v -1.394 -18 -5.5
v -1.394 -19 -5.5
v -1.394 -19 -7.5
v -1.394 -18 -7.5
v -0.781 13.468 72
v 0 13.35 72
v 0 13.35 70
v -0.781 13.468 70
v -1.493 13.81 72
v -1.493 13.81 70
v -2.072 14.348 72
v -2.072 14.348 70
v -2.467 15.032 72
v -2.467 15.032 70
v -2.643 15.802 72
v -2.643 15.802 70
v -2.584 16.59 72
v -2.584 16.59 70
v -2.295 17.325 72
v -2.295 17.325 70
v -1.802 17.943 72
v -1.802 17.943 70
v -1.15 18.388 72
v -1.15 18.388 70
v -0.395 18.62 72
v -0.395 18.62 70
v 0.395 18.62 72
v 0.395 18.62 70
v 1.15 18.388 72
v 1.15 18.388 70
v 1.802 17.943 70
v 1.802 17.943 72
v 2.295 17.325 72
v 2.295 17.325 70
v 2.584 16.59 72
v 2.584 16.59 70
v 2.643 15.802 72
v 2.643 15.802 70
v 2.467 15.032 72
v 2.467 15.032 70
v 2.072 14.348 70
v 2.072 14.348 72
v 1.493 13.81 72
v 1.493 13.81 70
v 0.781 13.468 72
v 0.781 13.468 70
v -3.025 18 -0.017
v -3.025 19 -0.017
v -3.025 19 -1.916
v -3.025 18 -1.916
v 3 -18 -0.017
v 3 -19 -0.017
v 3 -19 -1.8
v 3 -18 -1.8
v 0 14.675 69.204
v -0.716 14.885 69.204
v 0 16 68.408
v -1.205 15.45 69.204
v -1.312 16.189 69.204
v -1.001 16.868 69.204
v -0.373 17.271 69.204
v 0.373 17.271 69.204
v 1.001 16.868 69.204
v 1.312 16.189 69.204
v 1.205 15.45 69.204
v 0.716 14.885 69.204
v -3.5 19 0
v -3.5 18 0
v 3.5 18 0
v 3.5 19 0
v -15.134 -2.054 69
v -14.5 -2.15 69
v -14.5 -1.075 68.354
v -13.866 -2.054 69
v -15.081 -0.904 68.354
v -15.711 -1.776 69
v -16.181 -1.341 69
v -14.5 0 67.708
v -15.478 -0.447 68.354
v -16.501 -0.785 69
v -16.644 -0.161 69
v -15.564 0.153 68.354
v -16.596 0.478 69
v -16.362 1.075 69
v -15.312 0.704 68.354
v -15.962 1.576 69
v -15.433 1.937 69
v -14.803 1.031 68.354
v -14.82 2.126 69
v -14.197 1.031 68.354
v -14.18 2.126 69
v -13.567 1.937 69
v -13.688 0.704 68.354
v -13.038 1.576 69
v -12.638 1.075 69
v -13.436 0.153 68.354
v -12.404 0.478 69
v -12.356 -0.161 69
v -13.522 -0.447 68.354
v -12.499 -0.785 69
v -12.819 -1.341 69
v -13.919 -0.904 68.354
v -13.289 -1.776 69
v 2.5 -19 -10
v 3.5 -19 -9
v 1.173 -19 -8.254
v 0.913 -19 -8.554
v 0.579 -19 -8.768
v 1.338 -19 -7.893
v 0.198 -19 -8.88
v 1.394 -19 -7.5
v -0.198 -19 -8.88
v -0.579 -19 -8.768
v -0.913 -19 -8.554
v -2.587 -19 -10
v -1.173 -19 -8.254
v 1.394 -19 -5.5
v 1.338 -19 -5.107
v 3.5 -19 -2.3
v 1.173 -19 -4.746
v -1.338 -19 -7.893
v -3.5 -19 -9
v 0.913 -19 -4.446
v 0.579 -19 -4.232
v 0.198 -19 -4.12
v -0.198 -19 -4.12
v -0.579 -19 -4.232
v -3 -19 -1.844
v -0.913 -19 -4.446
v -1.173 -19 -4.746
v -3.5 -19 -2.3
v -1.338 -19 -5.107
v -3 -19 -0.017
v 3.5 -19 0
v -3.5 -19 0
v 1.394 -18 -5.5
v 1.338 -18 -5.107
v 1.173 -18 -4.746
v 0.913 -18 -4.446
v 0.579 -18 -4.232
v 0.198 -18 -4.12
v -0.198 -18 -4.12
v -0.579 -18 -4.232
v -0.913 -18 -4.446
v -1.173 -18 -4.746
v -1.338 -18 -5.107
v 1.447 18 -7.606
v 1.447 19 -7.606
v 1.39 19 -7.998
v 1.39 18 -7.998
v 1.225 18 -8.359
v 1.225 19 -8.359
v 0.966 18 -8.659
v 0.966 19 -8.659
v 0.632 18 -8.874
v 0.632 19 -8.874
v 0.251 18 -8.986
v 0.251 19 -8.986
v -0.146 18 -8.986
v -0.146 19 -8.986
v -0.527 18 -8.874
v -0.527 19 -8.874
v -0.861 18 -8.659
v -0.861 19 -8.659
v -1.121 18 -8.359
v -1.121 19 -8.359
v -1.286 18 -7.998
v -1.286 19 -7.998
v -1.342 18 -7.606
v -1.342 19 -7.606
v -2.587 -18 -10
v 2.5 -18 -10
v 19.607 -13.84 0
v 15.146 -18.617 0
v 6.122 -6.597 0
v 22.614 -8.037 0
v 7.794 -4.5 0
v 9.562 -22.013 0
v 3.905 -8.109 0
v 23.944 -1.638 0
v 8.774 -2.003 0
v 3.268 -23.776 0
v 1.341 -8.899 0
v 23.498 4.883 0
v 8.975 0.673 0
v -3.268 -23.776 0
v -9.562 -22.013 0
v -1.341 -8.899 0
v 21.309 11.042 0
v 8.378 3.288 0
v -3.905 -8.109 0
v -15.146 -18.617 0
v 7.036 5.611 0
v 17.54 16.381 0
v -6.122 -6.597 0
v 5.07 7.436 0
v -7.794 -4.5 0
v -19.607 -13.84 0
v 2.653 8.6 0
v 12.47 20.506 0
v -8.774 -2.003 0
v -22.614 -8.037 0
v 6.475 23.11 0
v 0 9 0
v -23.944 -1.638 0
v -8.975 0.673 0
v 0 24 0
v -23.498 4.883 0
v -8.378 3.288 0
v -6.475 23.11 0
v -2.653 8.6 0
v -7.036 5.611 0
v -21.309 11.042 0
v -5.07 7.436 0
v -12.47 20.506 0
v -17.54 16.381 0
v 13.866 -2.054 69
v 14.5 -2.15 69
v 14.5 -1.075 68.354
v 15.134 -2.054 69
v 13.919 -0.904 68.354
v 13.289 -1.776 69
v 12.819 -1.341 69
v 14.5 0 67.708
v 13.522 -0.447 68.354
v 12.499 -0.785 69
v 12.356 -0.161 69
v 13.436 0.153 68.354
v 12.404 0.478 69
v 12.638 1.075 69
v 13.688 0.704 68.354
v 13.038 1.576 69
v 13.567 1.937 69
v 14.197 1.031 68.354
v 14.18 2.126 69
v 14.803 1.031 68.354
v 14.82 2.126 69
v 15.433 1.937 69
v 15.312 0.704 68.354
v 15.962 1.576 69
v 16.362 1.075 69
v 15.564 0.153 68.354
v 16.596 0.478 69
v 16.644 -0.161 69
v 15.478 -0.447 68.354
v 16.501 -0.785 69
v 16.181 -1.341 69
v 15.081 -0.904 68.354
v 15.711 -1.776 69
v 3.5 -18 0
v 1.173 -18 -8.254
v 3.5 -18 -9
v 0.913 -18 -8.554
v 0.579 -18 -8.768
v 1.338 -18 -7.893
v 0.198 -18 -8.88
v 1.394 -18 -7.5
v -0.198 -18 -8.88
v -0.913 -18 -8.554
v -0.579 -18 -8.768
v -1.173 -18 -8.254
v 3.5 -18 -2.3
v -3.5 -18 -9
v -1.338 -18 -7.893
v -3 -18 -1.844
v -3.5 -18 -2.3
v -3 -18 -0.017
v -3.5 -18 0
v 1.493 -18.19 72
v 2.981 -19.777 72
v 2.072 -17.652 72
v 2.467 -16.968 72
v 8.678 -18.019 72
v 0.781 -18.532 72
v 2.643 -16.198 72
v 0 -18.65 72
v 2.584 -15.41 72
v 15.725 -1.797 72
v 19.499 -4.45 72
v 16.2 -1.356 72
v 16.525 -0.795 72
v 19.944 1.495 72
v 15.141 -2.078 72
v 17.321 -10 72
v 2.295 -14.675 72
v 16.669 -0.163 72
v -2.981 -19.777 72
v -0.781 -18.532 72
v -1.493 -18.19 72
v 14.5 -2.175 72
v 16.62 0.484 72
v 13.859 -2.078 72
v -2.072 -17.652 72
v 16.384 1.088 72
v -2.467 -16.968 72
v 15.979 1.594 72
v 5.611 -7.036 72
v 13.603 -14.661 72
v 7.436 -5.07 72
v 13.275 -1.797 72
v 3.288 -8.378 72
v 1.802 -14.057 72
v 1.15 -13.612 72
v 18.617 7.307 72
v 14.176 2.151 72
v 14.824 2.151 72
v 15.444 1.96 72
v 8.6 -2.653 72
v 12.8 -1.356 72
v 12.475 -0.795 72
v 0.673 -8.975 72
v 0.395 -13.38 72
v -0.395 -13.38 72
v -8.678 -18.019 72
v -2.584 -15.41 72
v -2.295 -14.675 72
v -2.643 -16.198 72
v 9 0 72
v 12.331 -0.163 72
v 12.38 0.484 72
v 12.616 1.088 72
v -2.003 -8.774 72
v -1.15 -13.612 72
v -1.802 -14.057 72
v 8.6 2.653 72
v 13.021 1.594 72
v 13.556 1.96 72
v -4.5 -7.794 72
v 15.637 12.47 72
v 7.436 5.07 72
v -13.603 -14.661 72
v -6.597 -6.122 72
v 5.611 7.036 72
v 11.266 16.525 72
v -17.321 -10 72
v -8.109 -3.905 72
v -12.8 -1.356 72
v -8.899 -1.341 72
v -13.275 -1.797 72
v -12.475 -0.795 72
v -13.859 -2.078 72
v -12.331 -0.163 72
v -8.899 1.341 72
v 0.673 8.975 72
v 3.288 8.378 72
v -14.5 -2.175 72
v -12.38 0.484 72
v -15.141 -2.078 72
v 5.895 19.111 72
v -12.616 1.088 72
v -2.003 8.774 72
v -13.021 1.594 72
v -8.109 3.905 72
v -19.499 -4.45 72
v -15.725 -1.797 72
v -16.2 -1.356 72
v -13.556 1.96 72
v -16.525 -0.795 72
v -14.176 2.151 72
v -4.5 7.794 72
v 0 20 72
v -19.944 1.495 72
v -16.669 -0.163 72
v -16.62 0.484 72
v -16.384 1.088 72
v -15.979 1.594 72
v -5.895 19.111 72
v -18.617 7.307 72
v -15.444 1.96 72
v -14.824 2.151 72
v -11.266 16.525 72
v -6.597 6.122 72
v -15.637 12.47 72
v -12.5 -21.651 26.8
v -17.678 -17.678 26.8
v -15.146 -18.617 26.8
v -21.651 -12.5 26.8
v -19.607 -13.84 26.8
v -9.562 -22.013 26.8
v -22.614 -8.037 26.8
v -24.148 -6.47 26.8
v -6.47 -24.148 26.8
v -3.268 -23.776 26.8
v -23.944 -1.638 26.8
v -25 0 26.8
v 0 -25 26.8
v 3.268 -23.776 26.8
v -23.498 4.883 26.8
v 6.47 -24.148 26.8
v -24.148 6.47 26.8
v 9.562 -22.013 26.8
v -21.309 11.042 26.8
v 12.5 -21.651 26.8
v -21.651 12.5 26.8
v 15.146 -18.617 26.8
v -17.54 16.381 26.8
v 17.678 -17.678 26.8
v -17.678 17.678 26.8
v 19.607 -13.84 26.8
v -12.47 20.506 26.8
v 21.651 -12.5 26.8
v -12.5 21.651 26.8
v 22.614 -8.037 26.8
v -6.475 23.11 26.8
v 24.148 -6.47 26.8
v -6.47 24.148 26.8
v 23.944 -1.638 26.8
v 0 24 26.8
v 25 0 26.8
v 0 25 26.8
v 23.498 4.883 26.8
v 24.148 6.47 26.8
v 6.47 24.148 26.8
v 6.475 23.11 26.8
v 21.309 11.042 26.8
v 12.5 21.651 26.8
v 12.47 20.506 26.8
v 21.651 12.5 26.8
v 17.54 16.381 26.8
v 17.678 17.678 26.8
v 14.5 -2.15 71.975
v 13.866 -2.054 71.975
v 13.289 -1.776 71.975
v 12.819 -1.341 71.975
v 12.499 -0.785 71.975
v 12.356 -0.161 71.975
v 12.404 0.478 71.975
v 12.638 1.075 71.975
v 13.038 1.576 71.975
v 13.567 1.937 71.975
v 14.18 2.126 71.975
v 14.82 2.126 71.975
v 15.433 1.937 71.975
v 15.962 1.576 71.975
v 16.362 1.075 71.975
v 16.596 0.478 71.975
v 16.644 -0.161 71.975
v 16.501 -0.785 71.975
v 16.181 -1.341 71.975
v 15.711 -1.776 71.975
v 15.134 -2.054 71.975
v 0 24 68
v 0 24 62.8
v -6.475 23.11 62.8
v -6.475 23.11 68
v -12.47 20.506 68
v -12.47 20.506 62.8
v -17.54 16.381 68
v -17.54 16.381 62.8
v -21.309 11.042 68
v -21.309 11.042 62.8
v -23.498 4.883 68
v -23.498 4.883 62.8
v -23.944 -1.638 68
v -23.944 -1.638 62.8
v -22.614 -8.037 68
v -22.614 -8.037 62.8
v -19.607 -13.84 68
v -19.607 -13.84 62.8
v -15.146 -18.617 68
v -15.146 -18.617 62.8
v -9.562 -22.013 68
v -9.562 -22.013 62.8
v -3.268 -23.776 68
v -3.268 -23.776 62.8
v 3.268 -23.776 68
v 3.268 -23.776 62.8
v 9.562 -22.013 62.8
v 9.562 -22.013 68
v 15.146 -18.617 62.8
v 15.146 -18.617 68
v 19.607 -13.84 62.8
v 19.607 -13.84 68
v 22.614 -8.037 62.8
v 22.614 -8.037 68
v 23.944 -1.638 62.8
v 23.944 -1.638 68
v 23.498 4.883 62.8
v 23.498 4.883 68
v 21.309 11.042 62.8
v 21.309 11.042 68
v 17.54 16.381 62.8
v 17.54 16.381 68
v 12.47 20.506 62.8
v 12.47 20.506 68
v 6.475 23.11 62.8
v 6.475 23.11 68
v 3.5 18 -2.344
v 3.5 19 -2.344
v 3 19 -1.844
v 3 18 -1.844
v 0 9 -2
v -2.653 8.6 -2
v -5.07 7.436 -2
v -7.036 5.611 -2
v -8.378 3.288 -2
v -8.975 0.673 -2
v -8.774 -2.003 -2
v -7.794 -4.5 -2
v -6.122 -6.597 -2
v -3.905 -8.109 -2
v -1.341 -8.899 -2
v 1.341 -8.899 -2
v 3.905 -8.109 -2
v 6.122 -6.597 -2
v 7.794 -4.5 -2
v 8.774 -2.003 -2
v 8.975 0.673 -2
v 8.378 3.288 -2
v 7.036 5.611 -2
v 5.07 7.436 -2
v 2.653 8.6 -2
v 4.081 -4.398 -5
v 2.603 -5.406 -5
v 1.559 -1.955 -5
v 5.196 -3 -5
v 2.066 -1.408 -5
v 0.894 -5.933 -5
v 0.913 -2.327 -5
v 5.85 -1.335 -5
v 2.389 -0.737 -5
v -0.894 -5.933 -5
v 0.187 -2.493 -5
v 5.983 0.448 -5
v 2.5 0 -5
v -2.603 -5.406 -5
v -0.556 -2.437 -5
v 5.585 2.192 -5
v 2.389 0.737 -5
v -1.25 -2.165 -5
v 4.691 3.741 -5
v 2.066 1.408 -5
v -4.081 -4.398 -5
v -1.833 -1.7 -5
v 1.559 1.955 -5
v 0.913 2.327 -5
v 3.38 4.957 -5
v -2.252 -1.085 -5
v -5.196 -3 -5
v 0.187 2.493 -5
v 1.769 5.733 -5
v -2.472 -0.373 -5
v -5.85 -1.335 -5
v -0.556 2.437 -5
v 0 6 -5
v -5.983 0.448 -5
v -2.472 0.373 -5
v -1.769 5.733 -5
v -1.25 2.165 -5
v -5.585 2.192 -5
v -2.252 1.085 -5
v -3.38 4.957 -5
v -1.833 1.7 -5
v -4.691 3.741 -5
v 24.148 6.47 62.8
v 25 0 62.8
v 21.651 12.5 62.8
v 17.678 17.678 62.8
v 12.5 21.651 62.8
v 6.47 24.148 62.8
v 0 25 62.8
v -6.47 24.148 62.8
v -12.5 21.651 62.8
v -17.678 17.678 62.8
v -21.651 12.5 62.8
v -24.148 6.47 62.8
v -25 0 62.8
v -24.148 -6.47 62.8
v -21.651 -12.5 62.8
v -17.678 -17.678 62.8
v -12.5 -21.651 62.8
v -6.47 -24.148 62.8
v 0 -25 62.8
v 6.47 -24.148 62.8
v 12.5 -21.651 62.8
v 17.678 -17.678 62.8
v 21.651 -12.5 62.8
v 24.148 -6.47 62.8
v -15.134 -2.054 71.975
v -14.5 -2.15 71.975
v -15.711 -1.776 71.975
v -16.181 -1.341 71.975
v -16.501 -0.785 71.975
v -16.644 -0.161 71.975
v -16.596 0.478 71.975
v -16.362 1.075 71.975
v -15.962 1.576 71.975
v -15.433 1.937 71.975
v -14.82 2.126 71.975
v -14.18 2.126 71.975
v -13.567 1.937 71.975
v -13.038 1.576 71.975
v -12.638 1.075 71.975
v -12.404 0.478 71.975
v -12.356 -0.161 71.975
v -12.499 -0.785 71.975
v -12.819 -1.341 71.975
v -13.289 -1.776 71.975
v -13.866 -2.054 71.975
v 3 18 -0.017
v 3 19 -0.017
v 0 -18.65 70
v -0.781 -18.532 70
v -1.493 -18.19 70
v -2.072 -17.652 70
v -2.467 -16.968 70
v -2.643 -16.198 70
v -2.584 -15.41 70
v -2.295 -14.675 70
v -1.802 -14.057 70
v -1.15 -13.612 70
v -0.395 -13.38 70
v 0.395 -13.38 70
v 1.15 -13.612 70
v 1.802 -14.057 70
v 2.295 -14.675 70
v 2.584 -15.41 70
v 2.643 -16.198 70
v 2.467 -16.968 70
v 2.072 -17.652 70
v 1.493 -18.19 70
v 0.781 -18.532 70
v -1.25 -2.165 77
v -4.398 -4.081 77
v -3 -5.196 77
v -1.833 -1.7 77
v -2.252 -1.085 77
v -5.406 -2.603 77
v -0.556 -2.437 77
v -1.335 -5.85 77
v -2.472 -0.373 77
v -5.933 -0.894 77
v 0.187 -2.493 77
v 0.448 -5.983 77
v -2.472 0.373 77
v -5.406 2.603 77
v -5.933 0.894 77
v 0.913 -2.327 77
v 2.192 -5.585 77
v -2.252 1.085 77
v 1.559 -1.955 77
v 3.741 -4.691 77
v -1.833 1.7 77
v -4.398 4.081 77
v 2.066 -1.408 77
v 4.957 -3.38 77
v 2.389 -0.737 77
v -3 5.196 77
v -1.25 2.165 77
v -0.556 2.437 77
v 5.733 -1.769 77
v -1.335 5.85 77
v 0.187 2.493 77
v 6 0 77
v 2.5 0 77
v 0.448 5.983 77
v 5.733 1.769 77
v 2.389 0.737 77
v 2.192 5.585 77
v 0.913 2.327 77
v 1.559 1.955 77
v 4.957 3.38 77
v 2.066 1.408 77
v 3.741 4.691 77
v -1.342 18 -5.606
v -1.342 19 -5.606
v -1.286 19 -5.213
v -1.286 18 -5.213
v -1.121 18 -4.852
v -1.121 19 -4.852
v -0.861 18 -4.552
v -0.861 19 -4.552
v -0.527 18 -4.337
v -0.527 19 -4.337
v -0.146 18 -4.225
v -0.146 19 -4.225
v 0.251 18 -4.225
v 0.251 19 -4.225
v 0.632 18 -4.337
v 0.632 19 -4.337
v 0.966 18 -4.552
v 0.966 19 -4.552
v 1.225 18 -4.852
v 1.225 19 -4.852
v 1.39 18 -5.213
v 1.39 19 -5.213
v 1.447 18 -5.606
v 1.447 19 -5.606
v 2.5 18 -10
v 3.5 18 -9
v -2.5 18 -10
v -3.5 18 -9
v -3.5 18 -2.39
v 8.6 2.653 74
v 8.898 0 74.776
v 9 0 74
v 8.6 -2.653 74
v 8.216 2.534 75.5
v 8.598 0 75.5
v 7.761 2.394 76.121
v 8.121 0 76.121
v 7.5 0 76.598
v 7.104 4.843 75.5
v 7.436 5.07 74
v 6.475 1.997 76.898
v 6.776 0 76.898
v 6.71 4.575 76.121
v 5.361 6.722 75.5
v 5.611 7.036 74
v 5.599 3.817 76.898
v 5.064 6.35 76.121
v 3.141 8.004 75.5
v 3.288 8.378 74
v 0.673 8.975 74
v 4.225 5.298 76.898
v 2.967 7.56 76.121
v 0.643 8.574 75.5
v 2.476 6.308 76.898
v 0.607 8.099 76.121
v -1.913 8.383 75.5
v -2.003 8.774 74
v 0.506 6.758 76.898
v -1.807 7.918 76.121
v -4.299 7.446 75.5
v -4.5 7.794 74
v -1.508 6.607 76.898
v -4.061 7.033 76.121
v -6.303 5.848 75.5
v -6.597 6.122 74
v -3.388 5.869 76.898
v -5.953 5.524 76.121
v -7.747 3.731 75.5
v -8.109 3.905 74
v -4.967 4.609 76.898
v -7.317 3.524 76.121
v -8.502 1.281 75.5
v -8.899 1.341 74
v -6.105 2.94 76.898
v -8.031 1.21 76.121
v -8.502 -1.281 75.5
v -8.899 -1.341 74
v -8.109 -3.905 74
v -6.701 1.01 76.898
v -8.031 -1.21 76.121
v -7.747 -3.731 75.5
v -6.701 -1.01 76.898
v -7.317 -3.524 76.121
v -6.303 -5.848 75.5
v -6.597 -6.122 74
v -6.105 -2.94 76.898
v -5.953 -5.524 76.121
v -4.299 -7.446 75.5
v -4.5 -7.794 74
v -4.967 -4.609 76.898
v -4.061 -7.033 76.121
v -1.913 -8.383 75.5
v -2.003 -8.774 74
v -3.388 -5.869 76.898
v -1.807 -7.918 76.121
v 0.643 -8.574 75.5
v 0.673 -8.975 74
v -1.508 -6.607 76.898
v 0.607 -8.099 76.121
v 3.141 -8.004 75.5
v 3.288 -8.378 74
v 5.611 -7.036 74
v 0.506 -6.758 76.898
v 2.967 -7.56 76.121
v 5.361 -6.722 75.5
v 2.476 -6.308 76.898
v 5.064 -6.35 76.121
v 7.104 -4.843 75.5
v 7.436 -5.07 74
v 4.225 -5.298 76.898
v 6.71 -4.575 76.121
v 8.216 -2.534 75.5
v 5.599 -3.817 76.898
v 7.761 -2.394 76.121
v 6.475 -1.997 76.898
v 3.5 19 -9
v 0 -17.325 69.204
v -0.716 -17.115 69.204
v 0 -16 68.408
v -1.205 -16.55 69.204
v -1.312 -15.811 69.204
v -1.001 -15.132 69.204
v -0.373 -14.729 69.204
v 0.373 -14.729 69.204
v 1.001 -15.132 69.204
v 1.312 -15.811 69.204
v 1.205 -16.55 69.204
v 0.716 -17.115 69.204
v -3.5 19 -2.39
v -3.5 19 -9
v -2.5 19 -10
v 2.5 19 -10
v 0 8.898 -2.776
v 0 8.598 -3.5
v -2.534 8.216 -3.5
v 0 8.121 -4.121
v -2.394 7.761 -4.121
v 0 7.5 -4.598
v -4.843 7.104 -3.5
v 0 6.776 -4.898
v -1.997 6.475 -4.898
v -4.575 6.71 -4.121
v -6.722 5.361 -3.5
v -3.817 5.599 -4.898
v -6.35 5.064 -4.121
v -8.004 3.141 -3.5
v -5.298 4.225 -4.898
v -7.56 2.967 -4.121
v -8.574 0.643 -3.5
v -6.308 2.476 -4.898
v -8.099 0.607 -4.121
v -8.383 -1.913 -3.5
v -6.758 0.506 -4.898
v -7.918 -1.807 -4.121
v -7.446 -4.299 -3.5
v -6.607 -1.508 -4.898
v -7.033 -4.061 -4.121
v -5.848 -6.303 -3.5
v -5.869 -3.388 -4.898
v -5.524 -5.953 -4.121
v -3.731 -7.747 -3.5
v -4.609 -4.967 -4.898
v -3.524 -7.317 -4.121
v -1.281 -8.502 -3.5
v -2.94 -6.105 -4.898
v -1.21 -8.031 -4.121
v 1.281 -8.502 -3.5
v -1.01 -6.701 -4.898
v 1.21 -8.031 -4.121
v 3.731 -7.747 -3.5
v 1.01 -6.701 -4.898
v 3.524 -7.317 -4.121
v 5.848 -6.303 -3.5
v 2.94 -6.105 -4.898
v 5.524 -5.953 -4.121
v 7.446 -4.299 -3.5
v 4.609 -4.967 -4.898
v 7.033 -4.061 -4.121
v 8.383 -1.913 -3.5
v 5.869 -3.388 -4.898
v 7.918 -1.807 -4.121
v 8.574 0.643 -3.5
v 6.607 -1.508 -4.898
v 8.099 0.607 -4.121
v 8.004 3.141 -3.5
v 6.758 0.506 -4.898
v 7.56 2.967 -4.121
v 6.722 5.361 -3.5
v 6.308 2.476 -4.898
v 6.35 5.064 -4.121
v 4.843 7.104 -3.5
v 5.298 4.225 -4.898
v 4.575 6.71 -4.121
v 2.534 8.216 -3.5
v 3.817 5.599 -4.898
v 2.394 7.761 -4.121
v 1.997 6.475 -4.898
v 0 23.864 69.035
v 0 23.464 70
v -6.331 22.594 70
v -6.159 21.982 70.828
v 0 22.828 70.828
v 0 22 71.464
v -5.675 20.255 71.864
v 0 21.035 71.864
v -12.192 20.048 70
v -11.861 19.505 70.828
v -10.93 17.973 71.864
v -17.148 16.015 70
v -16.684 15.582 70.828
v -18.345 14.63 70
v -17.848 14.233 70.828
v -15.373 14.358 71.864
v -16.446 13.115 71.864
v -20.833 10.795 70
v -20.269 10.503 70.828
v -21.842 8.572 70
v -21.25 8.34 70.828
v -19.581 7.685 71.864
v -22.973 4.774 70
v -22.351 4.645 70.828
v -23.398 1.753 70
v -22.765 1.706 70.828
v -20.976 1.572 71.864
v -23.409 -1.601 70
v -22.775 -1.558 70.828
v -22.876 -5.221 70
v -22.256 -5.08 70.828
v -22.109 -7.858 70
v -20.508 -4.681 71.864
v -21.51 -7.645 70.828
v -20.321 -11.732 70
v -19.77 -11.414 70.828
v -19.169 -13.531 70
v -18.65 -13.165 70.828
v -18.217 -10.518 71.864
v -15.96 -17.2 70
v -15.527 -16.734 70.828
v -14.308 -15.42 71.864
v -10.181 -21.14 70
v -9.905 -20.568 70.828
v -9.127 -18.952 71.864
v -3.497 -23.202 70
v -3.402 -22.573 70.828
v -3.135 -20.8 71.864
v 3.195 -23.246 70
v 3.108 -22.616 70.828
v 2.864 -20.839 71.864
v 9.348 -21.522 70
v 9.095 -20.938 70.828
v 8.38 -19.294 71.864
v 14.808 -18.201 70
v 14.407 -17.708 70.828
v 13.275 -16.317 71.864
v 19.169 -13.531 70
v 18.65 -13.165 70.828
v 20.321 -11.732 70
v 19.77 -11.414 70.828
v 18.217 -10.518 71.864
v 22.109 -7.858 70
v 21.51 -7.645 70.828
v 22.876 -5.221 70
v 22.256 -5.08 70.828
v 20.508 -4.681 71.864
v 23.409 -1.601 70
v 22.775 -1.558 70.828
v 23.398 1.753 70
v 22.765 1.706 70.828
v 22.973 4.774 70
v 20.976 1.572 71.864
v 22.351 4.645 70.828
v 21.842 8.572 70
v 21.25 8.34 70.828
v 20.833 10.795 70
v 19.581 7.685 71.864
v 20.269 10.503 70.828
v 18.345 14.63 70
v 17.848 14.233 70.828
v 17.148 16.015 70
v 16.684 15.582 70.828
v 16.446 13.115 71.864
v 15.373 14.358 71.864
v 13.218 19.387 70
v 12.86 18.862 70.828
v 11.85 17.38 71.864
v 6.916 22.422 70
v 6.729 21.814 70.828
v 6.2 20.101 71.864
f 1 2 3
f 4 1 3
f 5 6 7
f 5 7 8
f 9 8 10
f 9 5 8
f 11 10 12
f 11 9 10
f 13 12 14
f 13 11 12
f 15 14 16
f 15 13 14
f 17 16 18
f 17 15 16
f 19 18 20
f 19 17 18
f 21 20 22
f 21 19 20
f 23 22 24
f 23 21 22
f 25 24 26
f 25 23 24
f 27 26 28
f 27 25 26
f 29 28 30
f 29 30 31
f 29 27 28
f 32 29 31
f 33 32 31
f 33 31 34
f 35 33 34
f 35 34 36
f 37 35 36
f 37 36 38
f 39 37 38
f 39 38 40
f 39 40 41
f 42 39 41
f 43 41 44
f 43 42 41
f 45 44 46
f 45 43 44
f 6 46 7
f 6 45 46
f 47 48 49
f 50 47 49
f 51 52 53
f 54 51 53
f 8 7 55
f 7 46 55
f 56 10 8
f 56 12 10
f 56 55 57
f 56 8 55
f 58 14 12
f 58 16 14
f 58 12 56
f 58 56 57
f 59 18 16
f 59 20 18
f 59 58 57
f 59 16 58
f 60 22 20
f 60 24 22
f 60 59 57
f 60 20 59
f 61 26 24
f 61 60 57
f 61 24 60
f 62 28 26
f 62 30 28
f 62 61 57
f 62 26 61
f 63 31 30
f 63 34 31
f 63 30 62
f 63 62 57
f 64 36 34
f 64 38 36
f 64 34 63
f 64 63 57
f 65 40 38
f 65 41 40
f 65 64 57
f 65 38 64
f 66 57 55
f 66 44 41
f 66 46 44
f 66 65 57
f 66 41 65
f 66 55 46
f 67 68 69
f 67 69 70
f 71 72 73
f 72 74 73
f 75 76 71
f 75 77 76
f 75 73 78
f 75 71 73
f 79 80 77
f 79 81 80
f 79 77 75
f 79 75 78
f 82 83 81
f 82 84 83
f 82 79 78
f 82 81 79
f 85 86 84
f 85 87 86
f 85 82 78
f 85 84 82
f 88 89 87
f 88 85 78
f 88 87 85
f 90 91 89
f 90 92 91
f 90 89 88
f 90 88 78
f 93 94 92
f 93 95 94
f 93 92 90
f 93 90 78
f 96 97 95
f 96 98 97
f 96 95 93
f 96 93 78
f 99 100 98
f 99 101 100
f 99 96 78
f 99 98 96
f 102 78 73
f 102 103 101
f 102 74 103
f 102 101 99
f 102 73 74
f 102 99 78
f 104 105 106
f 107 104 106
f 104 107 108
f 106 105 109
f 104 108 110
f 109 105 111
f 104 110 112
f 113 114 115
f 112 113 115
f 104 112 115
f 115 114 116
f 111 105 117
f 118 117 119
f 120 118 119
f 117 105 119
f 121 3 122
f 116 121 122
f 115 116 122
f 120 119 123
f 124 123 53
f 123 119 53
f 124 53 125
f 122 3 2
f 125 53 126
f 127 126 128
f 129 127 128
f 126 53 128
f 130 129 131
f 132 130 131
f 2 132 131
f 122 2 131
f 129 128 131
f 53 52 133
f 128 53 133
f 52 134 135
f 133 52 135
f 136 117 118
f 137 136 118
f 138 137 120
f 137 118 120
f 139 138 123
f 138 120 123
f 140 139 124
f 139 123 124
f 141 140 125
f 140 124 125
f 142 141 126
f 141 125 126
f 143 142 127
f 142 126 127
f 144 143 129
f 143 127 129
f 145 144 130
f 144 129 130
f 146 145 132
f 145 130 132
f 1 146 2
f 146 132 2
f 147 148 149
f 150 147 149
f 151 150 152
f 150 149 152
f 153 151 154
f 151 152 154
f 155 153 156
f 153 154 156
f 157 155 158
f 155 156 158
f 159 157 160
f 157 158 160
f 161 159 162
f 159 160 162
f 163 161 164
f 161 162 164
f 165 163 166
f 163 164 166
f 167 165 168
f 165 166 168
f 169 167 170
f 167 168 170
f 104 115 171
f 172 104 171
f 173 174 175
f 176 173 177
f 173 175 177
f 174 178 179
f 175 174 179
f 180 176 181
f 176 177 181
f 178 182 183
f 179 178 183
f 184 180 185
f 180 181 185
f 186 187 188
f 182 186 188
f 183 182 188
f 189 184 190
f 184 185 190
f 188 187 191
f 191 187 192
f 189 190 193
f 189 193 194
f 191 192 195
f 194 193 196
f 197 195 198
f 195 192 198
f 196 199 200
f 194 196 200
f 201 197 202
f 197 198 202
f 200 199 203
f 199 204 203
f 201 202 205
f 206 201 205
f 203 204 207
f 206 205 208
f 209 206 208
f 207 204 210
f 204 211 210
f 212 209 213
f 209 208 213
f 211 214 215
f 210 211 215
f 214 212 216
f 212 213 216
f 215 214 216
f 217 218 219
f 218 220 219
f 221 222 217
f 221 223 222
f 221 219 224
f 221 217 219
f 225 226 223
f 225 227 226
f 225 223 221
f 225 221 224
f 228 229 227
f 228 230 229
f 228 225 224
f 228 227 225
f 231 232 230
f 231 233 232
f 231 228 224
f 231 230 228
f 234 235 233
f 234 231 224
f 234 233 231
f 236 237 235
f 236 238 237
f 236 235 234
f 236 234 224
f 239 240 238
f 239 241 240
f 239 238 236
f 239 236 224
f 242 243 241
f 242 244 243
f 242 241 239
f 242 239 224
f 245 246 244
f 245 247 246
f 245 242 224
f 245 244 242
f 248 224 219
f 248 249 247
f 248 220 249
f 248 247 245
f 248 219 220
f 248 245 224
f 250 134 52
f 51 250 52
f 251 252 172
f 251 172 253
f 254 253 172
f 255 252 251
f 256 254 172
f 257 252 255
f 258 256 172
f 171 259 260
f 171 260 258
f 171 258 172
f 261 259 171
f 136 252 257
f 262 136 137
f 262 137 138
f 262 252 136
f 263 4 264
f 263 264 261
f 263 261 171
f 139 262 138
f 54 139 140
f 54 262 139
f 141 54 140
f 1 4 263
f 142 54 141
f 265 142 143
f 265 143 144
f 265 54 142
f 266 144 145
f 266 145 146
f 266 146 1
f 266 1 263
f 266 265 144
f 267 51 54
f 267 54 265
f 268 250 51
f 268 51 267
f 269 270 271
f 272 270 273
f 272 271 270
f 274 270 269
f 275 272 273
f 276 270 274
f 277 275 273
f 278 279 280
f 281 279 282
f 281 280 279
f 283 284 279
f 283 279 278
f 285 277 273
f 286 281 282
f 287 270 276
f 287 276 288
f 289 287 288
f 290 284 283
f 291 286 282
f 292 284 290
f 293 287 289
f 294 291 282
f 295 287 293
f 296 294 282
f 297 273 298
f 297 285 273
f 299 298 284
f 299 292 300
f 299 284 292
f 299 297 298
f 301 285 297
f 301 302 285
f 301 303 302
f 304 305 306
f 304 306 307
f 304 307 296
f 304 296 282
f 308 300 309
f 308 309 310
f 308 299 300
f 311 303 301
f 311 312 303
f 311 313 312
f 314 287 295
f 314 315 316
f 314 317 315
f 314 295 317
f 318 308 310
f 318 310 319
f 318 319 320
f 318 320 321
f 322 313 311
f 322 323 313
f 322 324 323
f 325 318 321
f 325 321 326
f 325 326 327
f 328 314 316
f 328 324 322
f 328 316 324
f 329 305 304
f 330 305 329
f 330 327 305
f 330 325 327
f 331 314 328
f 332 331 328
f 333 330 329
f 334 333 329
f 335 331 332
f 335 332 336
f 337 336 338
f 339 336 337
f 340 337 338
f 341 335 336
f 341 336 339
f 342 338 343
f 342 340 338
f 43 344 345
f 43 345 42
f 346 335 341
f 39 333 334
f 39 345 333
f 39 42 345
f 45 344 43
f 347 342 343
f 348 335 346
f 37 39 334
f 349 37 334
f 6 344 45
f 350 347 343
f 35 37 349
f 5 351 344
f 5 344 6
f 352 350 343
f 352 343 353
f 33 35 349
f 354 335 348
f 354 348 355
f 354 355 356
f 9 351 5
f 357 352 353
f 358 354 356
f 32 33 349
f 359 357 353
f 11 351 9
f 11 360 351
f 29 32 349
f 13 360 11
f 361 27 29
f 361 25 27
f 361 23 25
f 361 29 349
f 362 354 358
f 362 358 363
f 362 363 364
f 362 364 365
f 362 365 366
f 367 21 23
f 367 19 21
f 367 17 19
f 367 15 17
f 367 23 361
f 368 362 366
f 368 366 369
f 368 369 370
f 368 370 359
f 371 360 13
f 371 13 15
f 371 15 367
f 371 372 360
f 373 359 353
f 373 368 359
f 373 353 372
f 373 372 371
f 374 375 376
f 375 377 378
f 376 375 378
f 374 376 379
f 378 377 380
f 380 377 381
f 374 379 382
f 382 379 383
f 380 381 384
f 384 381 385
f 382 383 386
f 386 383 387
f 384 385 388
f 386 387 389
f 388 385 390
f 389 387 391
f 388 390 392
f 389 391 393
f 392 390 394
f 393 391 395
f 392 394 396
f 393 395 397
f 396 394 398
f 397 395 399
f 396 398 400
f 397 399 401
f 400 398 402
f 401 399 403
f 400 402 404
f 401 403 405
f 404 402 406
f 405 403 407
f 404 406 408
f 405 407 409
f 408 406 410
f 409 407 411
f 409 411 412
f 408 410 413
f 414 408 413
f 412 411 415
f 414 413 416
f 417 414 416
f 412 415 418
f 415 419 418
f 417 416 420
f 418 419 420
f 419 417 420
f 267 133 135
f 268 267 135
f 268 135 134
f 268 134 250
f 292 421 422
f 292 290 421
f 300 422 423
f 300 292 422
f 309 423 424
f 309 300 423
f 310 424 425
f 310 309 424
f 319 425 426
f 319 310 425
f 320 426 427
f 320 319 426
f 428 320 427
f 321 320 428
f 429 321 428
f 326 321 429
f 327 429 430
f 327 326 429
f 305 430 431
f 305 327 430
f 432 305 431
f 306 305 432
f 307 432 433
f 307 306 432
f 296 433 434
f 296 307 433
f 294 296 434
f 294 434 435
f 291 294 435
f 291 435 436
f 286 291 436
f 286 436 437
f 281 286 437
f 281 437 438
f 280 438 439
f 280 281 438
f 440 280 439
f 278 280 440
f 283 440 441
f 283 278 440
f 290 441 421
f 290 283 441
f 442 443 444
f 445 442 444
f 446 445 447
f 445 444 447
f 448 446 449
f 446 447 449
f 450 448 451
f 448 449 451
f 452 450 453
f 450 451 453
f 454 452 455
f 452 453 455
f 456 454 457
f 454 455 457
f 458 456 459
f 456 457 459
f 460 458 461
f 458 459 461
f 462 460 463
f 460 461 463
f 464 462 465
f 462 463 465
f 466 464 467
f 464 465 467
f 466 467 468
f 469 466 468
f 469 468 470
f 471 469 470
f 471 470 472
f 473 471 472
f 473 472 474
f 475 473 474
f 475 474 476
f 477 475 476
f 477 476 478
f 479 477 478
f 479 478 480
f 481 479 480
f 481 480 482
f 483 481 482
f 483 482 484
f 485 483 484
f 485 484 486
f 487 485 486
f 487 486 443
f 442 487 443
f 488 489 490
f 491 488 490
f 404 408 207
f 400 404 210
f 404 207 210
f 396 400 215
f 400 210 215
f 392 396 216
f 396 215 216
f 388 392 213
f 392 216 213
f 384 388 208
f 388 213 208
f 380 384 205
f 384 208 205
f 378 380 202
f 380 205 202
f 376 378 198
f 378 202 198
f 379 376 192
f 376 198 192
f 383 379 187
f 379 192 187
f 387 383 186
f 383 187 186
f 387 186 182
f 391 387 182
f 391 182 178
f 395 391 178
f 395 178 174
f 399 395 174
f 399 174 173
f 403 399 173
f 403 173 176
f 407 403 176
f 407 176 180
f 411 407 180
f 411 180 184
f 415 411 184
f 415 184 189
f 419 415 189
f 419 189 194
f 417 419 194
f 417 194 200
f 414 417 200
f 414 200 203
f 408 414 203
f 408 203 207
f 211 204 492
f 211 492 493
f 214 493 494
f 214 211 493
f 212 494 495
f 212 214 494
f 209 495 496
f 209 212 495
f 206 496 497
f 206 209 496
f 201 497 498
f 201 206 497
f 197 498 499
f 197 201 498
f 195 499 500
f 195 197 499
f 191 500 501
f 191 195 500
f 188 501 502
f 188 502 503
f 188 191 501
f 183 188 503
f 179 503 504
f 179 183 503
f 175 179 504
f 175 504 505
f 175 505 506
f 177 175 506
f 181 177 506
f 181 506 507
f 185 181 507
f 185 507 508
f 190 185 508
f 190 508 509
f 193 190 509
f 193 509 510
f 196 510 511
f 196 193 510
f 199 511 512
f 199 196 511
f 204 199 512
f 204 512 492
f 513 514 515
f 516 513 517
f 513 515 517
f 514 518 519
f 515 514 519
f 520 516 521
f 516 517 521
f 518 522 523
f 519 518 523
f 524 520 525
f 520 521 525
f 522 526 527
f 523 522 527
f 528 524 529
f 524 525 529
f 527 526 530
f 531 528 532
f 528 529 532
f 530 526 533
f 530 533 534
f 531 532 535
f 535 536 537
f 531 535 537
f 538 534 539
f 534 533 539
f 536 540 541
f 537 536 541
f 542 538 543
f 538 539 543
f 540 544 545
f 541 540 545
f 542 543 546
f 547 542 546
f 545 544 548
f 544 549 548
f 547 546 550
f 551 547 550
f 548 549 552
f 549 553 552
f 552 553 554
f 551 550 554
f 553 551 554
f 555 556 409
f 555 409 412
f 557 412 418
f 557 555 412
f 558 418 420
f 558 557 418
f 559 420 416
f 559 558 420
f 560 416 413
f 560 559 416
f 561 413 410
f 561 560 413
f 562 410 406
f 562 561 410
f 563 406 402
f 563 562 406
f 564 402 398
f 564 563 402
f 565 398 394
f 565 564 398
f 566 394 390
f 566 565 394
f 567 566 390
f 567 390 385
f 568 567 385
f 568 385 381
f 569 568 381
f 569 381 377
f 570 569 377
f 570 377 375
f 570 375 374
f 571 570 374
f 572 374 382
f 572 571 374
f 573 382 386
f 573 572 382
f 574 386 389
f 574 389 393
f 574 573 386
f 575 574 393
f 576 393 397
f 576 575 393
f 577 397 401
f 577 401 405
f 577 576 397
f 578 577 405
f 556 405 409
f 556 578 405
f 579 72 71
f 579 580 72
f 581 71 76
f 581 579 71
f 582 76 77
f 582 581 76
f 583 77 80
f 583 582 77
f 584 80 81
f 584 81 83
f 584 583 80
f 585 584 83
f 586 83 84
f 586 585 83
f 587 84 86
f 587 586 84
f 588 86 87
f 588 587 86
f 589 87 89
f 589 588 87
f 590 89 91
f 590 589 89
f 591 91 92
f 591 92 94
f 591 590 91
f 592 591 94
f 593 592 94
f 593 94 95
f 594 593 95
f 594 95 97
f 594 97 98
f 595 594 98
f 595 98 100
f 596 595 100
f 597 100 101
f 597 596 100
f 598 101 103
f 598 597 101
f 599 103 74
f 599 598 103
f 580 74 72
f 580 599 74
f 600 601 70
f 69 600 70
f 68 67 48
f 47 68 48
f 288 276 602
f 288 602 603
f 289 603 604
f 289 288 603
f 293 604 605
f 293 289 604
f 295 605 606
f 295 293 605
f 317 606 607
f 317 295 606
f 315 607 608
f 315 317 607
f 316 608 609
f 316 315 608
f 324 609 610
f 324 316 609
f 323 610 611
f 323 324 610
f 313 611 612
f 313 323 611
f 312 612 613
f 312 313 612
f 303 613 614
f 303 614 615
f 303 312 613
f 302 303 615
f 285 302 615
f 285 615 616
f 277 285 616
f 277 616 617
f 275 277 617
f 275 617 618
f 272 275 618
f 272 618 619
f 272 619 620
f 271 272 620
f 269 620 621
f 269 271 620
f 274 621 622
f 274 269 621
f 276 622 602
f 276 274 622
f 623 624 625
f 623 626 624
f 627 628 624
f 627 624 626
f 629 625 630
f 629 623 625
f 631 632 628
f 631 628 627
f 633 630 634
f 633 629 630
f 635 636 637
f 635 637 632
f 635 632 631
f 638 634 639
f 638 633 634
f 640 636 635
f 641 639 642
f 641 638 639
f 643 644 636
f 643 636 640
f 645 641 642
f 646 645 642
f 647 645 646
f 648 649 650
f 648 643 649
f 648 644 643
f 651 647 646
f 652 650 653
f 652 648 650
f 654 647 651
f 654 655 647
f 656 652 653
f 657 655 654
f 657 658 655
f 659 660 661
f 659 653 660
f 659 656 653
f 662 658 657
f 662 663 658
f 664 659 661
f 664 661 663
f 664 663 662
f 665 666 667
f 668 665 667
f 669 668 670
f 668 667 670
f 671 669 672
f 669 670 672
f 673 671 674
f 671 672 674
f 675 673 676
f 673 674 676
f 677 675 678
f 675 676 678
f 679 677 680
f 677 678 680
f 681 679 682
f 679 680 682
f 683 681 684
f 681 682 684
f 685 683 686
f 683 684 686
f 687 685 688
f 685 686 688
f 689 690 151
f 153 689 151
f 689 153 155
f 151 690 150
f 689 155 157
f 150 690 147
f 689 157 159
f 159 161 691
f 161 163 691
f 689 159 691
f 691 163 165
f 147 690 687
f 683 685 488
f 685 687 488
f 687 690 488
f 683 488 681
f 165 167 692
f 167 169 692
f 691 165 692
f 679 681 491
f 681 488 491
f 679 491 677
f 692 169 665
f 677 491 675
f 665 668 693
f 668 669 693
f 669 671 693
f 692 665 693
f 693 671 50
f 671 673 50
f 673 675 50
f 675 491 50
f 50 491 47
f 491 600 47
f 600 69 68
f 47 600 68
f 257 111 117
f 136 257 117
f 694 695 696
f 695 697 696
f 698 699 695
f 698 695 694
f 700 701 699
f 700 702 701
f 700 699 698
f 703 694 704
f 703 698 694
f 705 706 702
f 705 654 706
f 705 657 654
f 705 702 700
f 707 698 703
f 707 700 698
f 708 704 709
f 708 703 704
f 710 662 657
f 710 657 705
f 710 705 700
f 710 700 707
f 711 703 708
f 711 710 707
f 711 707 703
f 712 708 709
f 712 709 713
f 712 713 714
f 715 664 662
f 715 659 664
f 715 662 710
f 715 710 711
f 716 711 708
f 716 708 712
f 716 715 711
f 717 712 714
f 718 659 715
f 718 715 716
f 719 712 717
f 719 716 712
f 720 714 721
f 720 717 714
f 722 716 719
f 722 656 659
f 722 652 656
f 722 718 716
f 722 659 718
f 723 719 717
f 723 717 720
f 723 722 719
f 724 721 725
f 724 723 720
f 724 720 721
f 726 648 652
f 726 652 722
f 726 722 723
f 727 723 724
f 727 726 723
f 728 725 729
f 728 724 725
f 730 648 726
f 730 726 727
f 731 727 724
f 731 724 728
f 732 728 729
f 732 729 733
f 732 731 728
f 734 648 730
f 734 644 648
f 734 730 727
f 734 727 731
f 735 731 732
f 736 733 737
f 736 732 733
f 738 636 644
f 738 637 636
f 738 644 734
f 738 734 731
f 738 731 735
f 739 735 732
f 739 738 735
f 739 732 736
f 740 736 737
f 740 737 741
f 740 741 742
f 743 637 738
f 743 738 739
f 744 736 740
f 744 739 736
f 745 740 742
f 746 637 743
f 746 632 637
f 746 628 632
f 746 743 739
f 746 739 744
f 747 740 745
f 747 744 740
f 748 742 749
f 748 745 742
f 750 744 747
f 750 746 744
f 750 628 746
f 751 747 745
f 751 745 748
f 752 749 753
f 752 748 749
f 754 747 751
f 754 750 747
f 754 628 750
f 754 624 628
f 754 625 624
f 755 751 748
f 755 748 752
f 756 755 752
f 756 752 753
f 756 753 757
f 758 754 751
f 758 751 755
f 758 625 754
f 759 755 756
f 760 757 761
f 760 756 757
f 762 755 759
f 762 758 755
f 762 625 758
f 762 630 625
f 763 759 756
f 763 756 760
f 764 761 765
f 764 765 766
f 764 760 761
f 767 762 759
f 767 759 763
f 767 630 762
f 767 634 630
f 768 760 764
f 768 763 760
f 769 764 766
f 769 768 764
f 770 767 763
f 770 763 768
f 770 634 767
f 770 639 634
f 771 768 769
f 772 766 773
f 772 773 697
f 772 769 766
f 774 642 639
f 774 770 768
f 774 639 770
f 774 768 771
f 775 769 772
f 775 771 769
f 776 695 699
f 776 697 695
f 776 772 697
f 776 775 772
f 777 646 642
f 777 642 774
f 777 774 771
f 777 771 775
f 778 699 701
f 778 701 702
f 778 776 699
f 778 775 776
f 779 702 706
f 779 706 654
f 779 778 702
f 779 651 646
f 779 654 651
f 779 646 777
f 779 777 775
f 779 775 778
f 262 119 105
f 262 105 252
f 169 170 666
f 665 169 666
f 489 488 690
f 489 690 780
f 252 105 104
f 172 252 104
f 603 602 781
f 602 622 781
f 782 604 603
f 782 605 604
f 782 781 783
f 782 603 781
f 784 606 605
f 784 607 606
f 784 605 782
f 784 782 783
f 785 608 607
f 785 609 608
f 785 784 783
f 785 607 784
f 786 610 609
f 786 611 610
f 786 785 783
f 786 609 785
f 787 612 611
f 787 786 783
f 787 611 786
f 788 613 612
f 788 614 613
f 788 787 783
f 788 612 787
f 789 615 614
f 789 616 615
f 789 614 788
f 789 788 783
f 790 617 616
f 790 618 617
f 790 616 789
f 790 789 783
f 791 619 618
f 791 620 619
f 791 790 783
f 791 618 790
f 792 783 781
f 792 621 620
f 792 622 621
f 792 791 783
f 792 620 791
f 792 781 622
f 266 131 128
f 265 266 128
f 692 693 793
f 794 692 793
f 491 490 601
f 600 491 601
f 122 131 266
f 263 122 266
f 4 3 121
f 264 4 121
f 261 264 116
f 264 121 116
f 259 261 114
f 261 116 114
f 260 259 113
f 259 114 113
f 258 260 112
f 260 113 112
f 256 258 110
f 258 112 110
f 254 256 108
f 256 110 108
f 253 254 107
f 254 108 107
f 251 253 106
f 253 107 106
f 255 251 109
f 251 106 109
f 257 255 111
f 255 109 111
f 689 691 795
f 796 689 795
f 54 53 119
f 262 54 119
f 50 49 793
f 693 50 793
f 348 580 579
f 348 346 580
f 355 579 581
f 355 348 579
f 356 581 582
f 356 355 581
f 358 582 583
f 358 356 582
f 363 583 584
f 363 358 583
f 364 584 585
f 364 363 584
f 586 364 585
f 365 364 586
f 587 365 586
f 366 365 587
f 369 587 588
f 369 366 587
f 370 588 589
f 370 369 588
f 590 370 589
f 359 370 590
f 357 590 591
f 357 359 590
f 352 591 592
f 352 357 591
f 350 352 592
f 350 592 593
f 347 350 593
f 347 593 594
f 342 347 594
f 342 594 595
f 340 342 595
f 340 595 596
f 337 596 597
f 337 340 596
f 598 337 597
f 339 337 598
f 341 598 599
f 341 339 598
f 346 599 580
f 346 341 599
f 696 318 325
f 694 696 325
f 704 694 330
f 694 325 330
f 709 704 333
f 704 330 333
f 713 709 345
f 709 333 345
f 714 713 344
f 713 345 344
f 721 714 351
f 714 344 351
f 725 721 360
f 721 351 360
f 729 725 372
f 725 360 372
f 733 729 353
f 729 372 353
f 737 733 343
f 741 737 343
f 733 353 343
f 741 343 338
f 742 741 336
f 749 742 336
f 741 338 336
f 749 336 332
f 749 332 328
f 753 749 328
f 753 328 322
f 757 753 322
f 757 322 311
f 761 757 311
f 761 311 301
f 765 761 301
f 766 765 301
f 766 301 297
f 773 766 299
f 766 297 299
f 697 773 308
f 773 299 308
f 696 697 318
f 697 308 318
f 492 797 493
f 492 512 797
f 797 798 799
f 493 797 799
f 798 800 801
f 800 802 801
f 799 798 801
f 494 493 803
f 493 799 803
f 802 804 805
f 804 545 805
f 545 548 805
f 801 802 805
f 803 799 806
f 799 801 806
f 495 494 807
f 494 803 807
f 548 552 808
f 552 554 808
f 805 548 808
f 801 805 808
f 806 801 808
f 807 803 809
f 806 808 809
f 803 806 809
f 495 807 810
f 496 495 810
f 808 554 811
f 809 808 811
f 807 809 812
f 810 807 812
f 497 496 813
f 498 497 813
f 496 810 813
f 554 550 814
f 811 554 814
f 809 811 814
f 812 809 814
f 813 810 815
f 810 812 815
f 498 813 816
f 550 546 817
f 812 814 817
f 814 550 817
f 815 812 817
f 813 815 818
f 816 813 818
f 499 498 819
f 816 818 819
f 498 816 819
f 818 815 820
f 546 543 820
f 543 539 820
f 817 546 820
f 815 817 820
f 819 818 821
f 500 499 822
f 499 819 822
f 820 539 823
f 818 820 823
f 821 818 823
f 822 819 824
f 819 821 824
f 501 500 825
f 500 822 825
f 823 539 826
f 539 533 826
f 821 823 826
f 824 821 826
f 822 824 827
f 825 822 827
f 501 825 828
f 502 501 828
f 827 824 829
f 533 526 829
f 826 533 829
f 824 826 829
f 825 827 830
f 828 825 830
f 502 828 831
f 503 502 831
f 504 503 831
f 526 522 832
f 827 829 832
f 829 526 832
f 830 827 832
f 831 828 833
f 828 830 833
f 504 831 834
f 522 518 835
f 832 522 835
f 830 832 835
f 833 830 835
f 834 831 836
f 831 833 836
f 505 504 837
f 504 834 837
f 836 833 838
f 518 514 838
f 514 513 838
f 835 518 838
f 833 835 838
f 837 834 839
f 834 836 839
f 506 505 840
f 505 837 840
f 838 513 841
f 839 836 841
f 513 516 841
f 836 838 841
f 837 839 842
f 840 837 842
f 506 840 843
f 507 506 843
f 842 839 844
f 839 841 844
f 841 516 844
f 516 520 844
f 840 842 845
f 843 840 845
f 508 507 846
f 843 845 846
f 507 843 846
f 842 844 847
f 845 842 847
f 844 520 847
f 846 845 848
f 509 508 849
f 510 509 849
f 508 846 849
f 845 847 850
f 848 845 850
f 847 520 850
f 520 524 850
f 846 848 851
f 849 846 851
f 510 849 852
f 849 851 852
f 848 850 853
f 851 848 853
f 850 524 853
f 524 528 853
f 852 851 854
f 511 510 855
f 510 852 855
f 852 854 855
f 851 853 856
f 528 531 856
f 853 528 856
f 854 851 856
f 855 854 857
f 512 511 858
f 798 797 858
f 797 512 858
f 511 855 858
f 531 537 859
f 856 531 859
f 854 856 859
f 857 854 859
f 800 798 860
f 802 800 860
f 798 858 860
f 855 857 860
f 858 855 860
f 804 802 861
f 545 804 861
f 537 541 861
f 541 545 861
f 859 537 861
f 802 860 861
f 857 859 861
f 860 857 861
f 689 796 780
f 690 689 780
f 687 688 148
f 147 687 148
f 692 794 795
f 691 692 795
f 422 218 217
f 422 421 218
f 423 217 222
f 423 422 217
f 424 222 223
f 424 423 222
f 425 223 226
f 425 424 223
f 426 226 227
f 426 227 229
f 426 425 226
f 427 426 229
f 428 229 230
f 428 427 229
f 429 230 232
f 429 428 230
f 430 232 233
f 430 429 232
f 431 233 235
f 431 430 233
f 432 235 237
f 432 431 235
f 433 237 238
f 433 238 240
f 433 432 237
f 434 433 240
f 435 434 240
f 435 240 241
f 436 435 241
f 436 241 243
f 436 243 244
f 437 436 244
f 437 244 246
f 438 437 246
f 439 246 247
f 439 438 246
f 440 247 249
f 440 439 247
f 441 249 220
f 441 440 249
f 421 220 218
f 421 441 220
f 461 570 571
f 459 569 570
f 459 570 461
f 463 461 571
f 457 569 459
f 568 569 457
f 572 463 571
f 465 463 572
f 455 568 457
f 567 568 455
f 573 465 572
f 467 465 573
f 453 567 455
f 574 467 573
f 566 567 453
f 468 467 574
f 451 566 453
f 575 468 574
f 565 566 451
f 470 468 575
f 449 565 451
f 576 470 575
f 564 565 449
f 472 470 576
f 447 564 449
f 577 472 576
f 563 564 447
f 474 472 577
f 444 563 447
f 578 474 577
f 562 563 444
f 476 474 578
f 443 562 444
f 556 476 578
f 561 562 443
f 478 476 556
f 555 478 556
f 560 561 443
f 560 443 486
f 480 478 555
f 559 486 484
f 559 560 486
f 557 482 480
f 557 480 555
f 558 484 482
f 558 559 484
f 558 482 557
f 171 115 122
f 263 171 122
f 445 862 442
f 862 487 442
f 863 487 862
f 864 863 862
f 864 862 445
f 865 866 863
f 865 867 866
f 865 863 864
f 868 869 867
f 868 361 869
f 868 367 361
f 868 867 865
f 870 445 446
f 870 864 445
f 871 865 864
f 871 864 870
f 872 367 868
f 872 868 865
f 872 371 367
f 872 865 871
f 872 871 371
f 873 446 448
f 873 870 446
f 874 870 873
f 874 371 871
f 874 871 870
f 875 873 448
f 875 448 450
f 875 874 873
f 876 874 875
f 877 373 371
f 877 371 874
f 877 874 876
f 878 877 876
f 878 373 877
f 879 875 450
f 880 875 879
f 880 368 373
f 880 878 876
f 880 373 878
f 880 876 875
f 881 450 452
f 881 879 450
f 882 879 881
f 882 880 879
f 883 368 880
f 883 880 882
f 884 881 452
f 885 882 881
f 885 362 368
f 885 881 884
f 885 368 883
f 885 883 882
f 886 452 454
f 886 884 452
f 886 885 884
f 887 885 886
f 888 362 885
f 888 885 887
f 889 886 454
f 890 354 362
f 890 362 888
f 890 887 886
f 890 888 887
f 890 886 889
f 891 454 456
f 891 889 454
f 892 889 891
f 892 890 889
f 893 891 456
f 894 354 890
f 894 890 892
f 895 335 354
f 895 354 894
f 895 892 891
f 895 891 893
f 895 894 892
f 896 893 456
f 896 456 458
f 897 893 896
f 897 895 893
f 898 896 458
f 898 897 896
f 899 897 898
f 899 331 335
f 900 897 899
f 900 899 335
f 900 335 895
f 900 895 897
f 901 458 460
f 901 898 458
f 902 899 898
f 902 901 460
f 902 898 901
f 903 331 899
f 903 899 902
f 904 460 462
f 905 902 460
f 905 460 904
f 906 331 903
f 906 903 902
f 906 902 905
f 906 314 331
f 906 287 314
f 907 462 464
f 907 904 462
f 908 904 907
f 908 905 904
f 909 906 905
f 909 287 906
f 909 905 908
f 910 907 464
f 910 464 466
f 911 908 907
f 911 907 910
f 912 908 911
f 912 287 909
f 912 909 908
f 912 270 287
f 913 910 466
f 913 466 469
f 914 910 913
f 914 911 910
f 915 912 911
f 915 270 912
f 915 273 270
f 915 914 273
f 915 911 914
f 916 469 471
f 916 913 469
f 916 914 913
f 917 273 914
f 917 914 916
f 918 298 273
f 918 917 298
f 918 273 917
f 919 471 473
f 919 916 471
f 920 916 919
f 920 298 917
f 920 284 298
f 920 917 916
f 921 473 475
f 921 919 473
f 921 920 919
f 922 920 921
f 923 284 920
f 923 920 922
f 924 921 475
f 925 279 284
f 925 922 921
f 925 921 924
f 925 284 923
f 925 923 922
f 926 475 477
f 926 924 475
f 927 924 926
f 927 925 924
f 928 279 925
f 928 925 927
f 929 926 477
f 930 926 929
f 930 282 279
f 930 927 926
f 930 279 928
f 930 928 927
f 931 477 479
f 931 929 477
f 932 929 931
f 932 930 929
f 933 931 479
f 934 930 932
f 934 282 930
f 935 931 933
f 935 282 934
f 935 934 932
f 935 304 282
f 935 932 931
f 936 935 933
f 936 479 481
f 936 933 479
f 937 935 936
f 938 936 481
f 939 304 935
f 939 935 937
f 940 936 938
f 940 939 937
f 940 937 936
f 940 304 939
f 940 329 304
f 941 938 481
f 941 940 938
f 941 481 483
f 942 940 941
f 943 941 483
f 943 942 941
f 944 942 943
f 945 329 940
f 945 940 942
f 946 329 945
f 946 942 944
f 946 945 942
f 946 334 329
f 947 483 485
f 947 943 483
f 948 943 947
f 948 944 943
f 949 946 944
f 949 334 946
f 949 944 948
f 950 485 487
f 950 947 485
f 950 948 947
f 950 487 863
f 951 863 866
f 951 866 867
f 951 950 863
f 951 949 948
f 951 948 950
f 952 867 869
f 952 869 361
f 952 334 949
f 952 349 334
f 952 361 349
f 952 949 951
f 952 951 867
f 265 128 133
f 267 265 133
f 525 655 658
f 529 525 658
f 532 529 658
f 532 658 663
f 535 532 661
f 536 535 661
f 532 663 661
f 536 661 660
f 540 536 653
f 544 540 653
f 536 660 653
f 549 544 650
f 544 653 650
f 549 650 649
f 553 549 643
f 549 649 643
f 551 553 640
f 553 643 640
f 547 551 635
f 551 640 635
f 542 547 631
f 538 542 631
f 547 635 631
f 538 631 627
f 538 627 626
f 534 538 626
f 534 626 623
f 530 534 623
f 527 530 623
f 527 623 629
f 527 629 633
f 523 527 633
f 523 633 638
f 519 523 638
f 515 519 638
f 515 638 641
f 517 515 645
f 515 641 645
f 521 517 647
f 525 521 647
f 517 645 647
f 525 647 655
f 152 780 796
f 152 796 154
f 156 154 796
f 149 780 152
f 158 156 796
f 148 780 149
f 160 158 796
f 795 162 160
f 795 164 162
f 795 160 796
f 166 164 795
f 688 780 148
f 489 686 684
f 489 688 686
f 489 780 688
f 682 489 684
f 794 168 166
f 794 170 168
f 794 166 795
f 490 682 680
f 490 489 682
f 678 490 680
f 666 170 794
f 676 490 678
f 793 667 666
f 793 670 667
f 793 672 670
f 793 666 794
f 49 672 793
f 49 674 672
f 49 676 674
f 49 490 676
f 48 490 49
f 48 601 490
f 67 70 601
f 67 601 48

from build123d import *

# Parameters (mm, degrees)
SKETCH1_R                     = 24
BOSS_EXTRUDE1_DEPTH           = 72
SKETCH6_R                     = 9
BOSS_EXTRUDE2_DEPTH           = 5
SKETCH7_R                     = 9
BOSS_EXTRUDE3_DEPTH           = 5
SKETCH8_R                     = 2.5
CUT_EXTRUDE5_DEPTH            = 82
FILLET3_R                     = 3
FILLET4_R                     = 4
BOSS_EXTRUDE4_START           = -9.2
SKETCH9_R                     = 25
SKETCH9_R_2                   = 24
BOSS_EXTRUDE4_DEPTH           = 36
SKETCH10_W                    = 1
SKETCH10_H                    = 7
BOSS_EXTRUDE5_DEPTH           = 10
BOSS_EXTRUDE5_2_DEPTH         = 10
M4_CLEARANCE_HOLE5_AT_2_COUNT = 2
M4_CLEARANCE_HOLE5_AT_2_PITCH = 29
M5_CLEARANCE_HOLE1_AT_2_COUNT = 2
M5_CLEARANCE_HOLE1_AT_2_PITCH = 32
CUT_EXTRUDE7_DEPTH            = 1
CUT_EXTRUDE8_DEPTH            = 1


with BuildPart() as part:
    # Sketch1 → Boss-Extrude1 (new body)
    with BuildSketch(Plane(origin=(0, 0, 0), x_dir=(0, 1, 0), z_dir=(0, 0, 1))):
        Circle(SKETCH1_R)
    extrude(amount=BOSS_EXTRUDE1_DEPTH)

    # Sketch6 → Boss-Extrude2 (add)
    with BuildSketch(Plane.XY.offset(72)):
        Circle(SKETCH6_R)
    extrude(amount=BOSS_EXTRUDE2_DEPTH)

    # Sketch7 → Boss-Extrude3 (add)
    with BuildSketch(Plane(origin=(0, 0, 0), x_dir=(0, 1, 0), z_dir=(0, 0, 1))):
        Circle(SKETCH7_R)
    extrude(amount=-BOSS_EXTRUDE3_DEPTH)

    # Sketch8 → Cut-Extrude5 (cut)
    with BuildSketch(Plane.XY.offset(77)):
        Circle(SKETCH8_R)
    extrude(amount=-CUT_EXTRUDE5_DEPTH, mode=Mode.SUBTRACT)

    # Fillet3
    fillet3_edges = [part.edges().sort_by_distance(p)[0] for p in [
        (0, -9, -5),
        (-9, 0, 77),
    ]]
    fillet(fillet3_edges, radius=FILLET3_R)

    # Fillet4
    fillet4_edges = [part.edges().sort_by_distance(p)[0] for p in [
        (0, -24, 72),
    ]]
    fillet(fillet4_edges, radius=FILLET4_R)

    # Sketch9 → Boss-Extrude4 (add)
    with BuildSketch(Plane.XY.offset(72).offset(BOSS_EXTRUDE4_START)):
        Circle(SKETCH9_R)
        Circle(SKETCH9_R_2, mode=Mode.SUBTRACT)
    extrude(amount=-BOSS_EXTRUDE4_DEPTH)

    # Sketch18 → M4 Clearance Hole5 (revolve, cut)
    with BuildSketch(Plane(origin=(14.5, 0, 72), x_dir=(0, -1, 0), z_dir=(1, 0, 0))):
        Polygon((0, 0), (0, 4.291850331), (2.15, 3), (2.15, 0.025), (2.175, 0), align=None)
    m4_clearance_hole5 = revolve(axis=Axis((14.5, 0, 78.35), (0, 0, -1)), mode=Mode.SUBTRACT)

    # M4 Clearance Hole5 at 2: M4 Clearance Hole5 ×2
    with Locations(*[(-i * M4_CLEARANCE_HOLE5_AT_2_PITCH, 0, 0) for i in range(1, M4_CLEARANCE_HOLE5_AT_2_COUNT)]):
        add(m4_clearance_hole5, mode=Mode.SUBTRACT)

    # Sketch20 → M5 Clearance Hole1 (revolve, cut)
    with BuildSketch(Plane(origin=(0, 16, 77), x_dir=(0, -1, 0), z_dir=(1, 0, 0))):
        Polygon((0, 0), (0, 8.59228064), (2.65, 7), (2.65, 0.025), (2.675, 0), align=None)
    m5_clearance_hole1 = revolve(axis=Axis((0, 16, 83.35), (0, 0, -1)), mode=Mode.SUBTRACT)

    # M5 Clearance Hole1 at 2: M5 Clearance Hole1 ×2
    with Locations(*[(0, -i * M5_CLEARANCE_HOLE1_AT_2_PITCH, 0) for i in range(1, M5_CLEARANCE_HOLE1_AT_2_COUNT)]):
        add(m5_clearance_hole1, mode=Mode.SUBTRACT)


with BuildPart() as body_2:
    # Sketch10 → Boss-Extrude5 (new body)
    with BuildSketch(Plane(origin=(0, 0, 0), x_dir=(0, 1, 0), z_dir=(0, 0, 1))):
        with Locations((-18.5, 0)):
            Rectangle(SKETCH10_W, SKETCH10_H)
    extrude(amount=-BOSS_EXTRUDE5_DEPTH)

    # Sketch21 → Cut-Extrude7 (cut)
    with BuildSketch(Plane.XZ.offset(19)):
        Polygon((-3, -1.843628969), (-3, -0.016625164), (-3.5, 0), (-3.5, -2.3), align=None)
        Polygon((3.5, 0), (3, -0.016625164), (3, -1.8), (3.5, -2.3), align=None)
        Polygon((-2.587257938, -10), (-3.5, -9), (-3.5, -10), align=None)
        Polygon((3.5, -10), (3.5, -9), (2.5, -10), align=None)
        with BuildLine():
            Line((-1.394443017, -5.5), (-1.394443017, -7.5))
            ThreePointArc((-1.394443017, -7.5), (0, -8.894443017), (1.394443017, -7.5))
            Line((1.394443017, -7.5), (1.394443017, -5.5))
            ThreePointArc((1.394443017, -5.5), (0, -4.105556983), (-1.394443017, -5.5))
        make_face()
    extrude(amount=-CUT_EXTRUDE7_DEPTH, mode=Mode.SUBTRACT)


with BuildPart() as body_3:
    # Sketch10 → Boss-Extrude5 2 (new body)
    with BuildSketch(Plane(origin=(0, 0, 0), x_dir=(0, 1, 0), z_dir=(0, 0, 1))):
        with Locations((18.5, 0)):
            Rectangle(SKETCH10_W, SKETCH10_H)
    extrude(amount=-BOSS_EXTRUDE5_2_DEPTH)

    # Sketch23 → Cut-Extrude8 (cut)
    with BuildSketch(Plane(origin=(0, 19, 0), x_dir=(-1, 0, 0), z_dir=(0, 1, 0))):
        Polygon((-3, -1.843628969), (-3, -0.016625164), (-3.5, 0), (-3.5, -2.343628969), align=None)
        Polygon((3.5, 0), (3.025079896, -0.016625164), (3.025079896, -1.915500434), (3.5, -2.390420538), align=None)
        Polygon((-2.5, -10), (-3.5, -9), (-3.5, -10), align=None)
        Polygon((3.5, -10), (3.5, -9), (2.5, -10), align=None)
        with BuildLine():
            Line((-1.446794446, -5.605556983), (-1.446794446, -7.605556983))
            ThreePointArc((-1.446794446, -7.605556983), (-0.052351429, -9), (1.342091587, -7.605556983))
            Line((1.342091587, -7.605556983), (1.342091587, -5.605556983))
            ThreePointArc((1.342091587, -5.605556983), (-0.052351429, -4.211113967), (-1.446794446, -5.605556983))
        make_face()
    extrude(amount=-CUT_EXTRUDE8_DEPTH, mode=Mode.SUBTRACT)


solid = Compound([part.part, body_2.part, body_3.part])
